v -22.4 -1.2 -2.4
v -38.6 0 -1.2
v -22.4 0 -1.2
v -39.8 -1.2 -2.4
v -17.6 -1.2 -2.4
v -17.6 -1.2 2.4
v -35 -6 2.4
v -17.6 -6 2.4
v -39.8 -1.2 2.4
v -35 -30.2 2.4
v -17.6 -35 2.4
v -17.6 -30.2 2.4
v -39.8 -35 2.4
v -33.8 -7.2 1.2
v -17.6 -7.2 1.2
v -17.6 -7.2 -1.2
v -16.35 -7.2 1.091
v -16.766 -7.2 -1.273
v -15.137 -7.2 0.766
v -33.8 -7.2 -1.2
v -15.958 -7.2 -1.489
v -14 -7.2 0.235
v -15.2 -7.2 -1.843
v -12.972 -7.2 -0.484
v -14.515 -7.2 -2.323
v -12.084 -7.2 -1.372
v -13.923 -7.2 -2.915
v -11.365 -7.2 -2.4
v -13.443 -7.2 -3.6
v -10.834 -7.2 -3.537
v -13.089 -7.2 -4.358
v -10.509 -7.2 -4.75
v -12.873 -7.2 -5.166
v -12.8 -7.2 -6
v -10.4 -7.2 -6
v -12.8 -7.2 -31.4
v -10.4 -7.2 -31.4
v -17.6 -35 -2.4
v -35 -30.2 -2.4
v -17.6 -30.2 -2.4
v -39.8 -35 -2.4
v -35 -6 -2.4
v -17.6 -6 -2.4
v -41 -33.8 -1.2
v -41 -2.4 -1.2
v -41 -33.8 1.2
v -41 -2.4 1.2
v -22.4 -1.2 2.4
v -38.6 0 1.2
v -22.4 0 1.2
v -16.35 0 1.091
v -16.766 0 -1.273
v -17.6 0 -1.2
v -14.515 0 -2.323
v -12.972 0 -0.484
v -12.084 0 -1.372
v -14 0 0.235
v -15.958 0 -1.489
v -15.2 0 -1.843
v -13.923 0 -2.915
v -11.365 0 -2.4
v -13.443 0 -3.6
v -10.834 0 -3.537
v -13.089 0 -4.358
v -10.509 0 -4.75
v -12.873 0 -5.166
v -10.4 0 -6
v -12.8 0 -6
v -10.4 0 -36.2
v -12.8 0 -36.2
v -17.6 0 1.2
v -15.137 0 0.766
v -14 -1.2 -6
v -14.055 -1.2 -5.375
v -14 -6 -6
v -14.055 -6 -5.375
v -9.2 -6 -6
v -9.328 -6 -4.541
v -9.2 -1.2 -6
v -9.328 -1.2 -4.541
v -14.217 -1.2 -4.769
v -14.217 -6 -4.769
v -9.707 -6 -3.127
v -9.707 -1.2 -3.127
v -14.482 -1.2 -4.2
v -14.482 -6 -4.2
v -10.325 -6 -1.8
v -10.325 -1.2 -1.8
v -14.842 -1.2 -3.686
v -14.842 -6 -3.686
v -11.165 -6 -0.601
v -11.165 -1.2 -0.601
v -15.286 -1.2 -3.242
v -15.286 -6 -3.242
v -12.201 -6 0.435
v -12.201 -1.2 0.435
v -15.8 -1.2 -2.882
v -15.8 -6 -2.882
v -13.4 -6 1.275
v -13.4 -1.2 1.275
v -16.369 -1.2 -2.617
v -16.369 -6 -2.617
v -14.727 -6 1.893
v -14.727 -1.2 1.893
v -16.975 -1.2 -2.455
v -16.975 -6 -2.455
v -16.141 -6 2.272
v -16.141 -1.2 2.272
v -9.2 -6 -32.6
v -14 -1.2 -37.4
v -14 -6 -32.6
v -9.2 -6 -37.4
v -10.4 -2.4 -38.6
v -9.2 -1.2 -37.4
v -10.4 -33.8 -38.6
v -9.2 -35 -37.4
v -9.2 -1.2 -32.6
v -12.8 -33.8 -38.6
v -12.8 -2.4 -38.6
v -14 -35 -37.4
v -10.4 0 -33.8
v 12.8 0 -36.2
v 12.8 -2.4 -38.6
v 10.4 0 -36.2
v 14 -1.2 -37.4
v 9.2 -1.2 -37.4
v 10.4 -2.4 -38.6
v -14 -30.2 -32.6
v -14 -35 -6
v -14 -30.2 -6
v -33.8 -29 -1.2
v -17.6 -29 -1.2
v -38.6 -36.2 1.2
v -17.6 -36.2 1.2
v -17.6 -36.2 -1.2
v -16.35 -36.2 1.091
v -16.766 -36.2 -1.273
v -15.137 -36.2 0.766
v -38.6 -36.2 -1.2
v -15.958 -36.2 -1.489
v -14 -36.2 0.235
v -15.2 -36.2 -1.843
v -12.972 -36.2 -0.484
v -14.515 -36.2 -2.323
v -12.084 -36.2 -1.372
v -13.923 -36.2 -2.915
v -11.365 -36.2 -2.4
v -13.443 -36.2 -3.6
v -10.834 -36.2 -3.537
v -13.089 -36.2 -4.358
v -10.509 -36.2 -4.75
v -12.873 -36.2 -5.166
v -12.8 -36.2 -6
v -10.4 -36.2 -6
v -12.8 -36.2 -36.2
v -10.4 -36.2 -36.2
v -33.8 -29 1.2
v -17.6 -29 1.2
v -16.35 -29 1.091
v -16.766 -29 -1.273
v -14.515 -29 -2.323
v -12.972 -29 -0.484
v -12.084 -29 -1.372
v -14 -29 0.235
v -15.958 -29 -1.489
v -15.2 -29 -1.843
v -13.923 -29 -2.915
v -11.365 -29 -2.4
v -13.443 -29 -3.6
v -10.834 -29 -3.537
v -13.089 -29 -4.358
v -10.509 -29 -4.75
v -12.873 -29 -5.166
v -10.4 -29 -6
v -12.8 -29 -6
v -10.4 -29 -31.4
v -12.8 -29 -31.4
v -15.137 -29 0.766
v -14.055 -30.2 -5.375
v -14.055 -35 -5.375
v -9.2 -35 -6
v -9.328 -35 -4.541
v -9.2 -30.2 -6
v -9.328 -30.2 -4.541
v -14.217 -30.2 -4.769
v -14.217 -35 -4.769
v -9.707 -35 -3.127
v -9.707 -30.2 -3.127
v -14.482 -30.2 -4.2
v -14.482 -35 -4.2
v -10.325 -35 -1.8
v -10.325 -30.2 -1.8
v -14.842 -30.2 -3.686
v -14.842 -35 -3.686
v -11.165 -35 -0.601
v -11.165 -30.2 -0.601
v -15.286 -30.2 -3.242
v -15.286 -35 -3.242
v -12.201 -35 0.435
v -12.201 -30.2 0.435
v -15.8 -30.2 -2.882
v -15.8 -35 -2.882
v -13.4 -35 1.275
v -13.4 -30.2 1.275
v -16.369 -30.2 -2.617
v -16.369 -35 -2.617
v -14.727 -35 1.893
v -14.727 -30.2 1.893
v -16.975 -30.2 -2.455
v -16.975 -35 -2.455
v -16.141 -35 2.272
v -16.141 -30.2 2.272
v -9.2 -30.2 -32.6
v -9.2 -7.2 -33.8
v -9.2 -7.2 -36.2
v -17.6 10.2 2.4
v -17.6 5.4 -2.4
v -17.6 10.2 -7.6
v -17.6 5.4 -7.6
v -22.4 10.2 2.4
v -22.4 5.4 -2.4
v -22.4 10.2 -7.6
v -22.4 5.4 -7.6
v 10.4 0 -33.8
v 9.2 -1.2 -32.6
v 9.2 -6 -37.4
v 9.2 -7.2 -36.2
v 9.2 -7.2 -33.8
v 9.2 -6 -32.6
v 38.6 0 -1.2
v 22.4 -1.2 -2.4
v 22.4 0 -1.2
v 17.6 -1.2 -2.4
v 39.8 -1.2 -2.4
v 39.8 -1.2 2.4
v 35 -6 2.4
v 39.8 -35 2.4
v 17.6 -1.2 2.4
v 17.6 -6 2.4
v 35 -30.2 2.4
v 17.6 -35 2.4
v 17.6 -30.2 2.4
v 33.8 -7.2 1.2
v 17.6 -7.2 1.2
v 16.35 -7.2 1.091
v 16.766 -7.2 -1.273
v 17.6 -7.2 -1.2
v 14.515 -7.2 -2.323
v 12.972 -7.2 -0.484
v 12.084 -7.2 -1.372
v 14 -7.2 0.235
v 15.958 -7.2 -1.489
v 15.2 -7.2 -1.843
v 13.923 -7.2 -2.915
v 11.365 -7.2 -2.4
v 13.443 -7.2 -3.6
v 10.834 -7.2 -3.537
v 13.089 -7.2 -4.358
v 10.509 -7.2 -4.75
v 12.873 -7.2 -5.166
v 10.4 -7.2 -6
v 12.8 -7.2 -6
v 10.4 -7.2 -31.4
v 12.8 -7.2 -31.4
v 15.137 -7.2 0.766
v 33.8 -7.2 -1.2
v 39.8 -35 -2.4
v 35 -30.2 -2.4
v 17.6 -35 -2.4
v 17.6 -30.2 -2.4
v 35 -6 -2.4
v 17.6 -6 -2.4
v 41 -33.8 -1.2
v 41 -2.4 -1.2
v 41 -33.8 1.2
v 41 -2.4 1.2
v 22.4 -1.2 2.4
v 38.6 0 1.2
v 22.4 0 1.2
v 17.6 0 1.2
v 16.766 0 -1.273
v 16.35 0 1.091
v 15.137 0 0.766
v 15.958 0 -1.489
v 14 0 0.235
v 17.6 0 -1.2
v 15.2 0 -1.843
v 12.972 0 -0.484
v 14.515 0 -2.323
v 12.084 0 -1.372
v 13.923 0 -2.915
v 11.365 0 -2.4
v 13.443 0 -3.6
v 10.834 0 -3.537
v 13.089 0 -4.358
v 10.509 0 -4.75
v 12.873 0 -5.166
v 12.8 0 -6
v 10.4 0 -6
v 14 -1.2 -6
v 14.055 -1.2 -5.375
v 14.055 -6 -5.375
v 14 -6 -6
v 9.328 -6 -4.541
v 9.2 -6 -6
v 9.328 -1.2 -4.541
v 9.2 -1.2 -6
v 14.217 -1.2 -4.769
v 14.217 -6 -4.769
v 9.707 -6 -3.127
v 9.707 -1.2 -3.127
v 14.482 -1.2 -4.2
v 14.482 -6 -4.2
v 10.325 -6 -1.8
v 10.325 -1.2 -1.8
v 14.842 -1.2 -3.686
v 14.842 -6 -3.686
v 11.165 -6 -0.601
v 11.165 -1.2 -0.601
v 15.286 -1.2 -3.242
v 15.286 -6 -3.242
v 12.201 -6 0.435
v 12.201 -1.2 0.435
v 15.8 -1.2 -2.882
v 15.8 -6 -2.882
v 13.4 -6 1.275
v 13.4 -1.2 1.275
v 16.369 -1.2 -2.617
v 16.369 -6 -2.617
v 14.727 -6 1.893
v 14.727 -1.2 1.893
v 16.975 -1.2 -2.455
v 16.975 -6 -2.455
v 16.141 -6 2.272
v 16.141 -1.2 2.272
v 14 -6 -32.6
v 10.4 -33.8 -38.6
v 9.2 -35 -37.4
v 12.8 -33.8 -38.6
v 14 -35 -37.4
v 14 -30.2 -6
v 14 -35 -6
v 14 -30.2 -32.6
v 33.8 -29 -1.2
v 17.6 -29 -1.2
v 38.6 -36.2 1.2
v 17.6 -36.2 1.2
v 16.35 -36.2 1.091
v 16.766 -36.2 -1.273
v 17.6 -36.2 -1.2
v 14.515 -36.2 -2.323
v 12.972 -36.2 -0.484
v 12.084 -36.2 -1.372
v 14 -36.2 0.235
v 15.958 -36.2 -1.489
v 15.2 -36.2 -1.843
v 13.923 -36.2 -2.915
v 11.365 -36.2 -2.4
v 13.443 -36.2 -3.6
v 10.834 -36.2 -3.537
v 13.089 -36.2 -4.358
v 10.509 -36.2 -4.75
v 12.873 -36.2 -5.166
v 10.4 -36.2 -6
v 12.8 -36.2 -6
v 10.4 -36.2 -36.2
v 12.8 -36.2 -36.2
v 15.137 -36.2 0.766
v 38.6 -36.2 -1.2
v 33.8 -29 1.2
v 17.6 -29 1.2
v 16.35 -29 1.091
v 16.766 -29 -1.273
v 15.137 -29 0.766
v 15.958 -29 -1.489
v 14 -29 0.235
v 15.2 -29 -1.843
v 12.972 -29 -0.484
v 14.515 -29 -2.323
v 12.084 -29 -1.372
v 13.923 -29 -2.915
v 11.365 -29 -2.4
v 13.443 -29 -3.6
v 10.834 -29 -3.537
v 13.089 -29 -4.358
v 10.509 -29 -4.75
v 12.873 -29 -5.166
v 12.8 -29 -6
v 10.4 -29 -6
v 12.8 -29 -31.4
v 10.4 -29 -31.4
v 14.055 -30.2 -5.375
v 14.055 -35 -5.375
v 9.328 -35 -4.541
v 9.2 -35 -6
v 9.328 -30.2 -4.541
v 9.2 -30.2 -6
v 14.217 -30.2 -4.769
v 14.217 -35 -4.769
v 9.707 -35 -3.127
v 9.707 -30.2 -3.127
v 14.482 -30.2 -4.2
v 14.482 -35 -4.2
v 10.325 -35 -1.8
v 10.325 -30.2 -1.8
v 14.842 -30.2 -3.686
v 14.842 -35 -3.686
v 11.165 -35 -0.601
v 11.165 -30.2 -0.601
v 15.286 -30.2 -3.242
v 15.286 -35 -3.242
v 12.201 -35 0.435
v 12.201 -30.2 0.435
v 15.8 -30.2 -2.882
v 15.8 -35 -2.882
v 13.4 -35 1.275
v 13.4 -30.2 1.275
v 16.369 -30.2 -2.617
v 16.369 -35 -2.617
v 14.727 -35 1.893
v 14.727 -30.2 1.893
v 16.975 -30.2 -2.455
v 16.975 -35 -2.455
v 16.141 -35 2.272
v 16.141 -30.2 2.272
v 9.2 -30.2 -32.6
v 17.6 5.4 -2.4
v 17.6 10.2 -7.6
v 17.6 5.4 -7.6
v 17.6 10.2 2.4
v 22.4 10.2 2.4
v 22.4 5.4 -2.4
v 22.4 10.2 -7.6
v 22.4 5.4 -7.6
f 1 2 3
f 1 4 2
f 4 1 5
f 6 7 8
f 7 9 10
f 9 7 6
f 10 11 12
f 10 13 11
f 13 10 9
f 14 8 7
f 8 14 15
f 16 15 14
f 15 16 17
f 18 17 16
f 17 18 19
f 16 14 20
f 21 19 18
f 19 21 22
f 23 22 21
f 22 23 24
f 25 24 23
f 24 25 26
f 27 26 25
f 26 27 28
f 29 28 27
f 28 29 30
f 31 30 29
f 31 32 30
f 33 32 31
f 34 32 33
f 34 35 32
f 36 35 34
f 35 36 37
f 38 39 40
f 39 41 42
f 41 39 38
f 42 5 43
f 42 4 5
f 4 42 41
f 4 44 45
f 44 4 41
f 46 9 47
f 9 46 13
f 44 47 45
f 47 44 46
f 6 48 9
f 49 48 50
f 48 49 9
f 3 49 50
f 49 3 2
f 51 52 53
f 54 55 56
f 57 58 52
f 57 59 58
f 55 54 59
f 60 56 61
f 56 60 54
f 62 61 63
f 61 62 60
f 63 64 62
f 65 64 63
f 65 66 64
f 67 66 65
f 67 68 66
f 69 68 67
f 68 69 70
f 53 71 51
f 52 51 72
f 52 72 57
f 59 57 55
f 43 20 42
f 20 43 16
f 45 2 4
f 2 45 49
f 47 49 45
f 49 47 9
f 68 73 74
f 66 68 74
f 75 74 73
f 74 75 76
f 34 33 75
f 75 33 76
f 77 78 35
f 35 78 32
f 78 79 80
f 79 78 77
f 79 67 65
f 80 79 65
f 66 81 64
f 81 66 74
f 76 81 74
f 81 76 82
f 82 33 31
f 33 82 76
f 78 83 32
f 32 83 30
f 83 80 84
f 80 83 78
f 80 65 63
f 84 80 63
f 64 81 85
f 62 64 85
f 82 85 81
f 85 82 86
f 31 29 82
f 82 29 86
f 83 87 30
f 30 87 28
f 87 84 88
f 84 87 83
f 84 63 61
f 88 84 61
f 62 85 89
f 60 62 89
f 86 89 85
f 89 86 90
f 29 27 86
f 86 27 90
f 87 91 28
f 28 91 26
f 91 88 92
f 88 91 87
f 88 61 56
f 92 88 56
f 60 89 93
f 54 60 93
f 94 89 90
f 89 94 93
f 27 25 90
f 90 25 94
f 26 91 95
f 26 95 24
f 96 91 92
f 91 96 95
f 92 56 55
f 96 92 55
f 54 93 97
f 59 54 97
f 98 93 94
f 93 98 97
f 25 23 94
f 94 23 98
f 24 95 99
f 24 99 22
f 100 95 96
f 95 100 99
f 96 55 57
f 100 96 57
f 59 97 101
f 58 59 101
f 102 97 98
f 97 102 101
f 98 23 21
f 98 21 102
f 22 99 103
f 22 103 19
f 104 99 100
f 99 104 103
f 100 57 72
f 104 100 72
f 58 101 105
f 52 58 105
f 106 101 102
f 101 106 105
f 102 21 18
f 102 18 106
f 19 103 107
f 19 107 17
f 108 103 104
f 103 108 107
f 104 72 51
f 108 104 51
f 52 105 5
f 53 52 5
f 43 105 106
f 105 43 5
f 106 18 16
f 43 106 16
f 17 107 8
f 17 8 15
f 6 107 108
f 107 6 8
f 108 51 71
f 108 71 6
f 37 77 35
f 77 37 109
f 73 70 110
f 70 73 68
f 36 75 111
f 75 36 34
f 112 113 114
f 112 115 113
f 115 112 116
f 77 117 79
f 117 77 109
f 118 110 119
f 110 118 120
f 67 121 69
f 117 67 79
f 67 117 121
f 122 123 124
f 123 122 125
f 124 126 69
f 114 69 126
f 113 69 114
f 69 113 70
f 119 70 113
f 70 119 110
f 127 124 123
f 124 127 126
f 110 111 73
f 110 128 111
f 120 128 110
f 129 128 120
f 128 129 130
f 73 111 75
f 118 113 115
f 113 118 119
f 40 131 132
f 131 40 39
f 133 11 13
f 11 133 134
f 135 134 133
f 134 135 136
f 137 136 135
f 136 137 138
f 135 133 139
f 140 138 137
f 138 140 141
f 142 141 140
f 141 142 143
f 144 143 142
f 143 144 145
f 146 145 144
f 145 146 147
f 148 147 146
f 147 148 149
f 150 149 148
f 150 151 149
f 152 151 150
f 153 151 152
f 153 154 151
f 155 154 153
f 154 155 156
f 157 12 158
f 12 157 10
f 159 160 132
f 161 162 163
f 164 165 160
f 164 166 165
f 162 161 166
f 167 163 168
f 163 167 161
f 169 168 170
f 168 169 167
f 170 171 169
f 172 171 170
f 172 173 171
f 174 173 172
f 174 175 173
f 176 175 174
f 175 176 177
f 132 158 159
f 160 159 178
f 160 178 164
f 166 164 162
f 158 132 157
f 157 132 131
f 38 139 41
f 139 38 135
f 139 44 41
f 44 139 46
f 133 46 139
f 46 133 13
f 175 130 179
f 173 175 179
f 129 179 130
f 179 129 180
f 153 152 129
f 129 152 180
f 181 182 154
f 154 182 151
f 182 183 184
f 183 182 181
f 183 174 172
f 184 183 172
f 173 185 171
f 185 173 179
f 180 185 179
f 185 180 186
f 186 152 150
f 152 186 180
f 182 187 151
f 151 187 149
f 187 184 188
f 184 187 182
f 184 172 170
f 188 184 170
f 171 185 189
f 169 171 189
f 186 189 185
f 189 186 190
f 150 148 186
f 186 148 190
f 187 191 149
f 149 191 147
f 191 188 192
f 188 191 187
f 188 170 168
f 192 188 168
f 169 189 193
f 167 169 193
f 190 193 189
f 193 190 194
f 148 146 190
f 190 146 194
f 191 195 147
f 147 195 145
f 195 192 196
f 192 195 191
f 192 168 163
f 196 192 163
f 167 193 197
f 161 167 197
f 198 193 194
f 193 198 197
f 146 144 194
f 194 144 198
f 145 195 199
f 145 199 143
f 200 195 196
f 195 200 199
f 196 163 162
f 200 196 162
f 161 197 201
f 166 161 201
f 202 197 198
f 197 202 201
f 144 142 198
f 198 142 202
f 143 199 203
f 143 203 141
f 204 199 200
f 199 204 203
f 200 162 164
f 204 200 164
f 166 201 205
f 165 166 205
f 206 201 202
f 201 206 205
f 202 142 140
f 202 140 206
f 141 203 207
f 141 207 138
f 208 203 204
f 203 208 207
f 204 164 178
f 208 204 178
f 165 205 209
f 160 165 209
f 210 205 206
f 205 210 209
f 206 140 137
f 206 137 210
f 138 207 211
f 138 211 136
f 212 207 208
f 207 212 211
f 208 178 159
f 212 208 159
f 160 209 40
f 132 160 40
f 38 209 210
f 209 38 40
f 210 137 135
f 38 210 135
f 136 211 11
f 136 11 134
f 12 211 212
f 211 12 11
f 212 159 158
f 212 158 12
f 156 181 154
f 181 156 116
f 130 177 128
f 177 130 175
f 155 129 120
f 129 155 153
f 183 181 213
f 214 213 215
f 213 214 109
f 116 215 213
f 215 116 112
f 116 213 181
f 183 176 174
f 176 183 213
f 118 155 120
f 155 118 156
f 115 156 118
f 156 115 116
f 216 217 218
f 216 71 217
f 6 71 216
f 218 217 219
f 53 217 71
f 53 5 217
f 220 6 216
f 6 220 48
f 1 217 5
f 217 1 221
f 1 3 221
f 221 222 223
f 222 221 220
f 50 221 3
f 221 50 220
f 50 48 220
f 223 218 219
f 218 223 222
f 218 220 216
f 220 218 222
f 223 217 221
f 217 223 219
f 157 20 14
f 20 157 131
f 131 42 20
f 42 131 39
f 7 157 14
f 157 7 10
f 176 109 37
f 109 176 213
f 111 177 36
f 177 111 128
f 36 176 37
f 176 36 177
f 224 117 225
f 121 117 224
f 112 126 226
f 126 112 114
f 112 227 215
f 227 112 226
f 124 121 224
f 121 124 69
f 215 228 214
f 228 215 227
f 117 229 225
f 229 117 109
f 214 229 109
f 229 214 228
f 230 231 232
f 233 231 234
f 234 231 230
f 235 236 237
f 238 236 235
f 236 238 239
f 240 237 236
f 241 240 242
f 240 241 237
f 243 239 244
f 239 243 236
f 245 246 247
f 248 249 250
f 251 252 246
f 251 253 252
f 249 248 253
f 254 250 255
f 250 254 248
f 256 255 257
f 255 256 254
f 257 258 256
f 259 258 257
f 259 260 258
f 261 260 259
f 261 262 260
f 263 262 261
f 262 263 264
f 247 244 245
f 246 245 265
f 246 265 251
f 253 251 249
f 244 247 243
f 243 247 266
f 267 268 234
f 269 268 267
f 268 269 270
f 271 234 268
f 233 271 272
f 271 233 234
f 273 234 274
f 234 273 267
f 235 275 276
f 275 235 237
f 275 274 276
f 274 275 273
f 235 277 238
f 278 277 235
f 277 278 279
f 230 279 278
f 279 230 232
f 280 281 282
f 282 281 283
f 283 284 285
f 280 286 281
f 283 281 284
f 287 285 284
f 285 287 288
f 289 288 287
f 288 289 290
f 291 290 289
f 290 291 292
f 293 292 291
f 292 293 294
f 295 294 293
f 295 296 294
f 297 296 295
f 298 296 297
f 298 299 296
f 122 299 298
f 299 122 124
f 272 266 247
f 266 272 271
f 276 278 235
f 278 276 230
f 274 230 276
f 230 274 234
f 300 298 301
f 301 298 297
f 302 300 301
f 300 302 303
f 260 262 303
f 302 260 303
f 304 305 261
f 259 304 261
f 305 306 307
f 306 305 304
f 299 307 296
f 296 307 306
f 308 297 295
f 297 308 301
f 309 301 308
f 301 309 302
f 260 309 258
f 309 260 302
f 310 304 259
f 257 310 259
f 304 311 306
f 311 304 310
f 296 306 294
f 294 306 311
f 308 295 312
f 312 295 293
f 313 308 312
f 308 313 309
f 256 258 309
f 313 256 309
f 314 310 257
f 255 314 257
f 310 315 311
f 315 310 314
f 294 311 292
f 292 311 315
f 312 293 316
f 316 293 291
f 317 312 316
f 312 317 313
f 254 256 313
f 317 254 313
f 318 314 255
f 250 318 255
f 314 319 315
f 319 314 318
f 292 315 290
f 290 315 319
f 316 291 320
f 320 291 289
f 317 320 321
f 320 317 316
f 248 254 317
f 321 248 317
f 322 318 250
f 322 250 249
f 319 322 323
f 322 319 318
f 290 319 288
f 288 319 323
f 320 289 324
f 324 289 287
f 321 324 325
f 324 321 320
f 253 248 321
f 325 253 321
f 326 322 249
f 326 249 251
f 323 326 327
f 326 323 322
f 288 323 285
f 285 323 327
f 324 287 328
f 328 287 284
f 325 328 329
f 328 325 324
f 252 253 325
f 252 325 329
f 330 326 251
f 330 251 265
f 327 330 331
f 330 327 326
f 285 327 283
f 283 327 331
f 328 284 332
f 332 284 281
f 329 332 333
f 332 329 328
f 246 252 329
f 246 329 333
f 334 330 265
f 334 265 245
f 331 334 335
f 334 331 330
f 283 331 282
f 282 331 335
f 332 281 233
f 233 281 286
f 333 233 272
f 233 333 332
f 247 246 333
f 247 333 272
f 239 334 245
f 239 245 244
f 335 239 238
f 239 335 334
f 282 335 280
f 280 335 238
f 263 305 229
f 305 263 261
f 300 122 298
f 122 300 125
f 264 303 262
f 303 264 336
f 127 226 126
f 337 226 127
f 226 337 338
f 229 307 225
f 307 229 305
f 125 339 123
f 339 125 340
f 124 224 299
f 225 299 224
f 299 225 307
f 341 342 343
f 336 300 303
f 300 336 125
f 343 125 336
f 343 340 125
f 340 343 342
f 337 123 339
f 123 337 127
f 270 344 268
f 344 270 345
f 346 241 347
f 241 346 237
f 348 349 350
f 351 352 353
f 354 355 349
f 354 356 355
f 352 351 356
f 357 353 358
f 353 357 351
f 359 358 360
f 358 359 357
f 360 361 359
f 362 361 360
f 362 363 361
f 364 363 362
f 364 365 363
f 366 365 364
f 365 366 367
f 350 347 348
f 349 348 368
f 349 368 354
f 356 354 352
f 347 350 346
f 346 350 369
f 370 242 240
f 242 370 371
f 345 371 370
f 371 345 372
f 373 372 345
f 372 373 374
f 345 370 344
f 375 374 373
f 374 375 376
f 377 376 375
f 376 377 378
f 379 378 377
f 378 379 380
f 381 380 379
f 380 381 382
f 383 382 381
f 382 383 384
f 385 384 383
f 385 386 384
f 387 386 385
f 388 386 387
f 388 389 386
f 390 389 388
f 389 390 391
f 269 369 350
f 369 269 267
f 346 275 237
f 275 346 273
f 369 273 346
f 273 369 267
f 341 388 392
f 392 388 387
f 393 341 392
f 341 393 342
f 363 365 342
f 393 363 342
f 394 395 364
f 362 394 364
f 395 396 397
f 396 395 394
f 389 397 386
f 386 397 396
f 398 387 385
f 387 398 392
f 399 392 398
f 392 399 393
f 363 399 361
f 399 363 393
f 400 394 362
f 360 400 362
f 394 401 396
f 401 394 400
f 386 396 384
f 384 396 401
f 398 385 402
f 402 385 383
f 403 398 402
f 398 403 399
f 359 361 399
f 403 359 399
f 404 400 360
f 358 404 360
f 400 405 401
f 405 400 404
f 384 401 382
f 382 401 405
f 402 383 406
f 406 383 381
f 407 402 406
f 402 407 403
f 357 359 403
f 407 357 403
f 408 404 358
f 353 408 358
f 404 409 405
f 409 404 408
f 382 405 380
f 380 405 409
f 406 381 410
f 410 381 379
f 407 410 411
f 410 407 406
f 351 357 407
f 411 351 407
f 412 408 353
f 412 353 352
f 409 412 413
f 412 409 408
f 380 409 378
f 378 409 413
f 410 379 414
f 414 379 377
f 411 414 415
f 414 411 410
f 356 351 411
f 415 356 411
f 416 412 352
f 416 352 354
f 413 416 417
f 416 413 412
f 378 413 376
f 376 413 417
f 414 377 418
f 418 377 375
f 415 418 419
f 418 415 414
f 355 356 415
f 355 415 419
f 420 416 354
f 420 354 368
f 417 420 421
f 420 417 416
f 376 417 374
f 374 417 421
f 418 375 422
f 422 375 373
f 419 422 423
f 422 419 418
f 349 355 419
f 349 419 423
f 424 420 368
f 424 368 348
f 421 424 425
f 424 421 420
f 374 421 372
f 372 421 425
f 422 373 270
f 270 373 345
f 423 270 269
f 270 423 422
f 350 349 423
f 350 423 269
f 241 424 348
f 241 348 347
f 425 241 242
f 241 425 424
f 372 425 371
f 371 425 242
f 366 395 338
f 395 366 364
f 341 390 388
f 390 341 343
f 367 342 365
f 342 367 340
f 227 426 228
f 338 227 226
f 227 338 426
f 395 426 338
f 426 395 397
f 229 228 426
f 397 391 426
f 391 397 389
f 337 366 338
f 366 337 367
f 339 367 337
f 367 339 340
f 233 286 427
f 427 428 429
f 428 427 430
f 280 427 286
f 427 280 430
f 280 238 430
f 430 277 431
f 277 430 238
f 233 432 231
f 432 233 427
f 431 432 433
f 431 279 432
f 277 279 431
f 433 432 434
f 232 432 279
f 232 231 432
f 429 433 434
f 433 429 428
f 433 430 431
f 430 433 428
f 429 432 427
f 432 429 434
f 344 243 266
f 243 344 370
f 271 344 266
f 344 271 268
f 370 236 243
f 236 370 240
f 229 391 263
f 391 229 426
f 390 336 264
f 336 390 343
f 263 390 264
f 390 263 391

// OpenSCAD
// 穴: 5mm x 15mm
// 厚さ: 5.3mm
// 縦の距離: 40mm

fragments = 36;
isJbl = false;
isHasami = false;
isPot = false;
isPillCase = false;
isQcyEarCuff = false;
isVernierCaliper = false;
is100KinEarphoneCase = false;

x = 2.4;
y = 4.8;
module p() {
    polygon([
            [x + 2.4, y],
            [x, -y],
            [-x, -y],
            [-x + 2.4, y],
            [-x + 2.4 + 1, y + 1],
            [x + 2.4 - 1, y + 1],
        ]);
}

module p2() {
    polygon([
            [2.4, 2.4],
            [2.4, -2.4],
            [-2.4, -2.4],
            [-2.4, 2.4],
            [-2.4 + 1, 2.4 + 1],
            [2.4 - 1, 2.4 + 1],
        ]);
}

module tip() {
    rotate_extrude(angle = 360, convexity = 10, $fn=128) {
        translate([0, 0, 0])
        polygon([
            [2.4, 2.4],
            [2.4, -2.4],
            [0, -2.4],
            [0, 2.4],
            [0, 2.4 + 1],
            [2.4 - 1, 2.4 + 1],
        ]);
    }
}

// size = [37.4, 12.4, 20.2]; // JBL イヤホン
// size = [12, 4, 7.2]; // ハサミ
// size = [18, 4, 37.2]; // ノギス
// size = [50, 6.6, 0]; // IKEA Pot
// size = [22, 29, 8]; // 鼻炎薬
// size = [58, 18, 8]; // QCY イヤーカフ
size = [29, 17.4, 26.6]; // 百均イヤホンケース

d = size[0];
w = size[1];
h = size[2];


if (isJbl) {
    translate([0, -22, 0])
    #cube([56, 29, 50], center = true);
}

if (isHasami) {
    translate([0, -9, 0])
    #cube([40, 3, 24], center = true);
}

if (isPot) {
    translate([0, -40, 22])
    #cylinder(h = 53, r1 = 43 / 2, r2 = 55 / 2, center = true, $fn = fragments);
}

if (isPillCase) {
    translate([0, -14, 0])
    #cube([88, 13.2, 30.2], center = true);
}

if (isQcyEarCuff) {
    translate([0, -32, 0])
    #cube([66, 49, 25.6], center = true);
}

if (isVernierCaliper) {
    translate([0, -12, 0])
    #cube([40, 9, 84], center = true);
}

if (is100KinEarphoneCase) {
    translate([0, -18, 0])
    // #cube([66, 21, 66], center = true);
    rotate([90, 0, 0])
    #cylinder(h = 21, r = 33, center = true);
}


/////////////////////////////////////////////////

module poly() {
    polygon([
        [1.2, 2.4 + 1.2],
        [2.4, 1.2 + 1.2],
        [2.4, -1.2 - 1.2],
        [1.2, -2.4 - 1.2],
        [-1.2, -2.4 - 1.2],
        [-2.4, -1.2 - 1.2],
        [-2.4, 1.2 + 1.2],
        [-1.2, 2.4 + 1.2],
    ]);
}

module xyz() {
    linear_extrude(height = 4.8, center = true, convexity = 10, $fn = fragments) {
        poly();
    }
}
module abc() {
    
    intersection() {
        xyz();
        rotate([0, 90, 0])
        xyz();

    }

}
module node() {
    union() {
        abc();
        rotate([0, 0, 90])
        abc();
    }
}




module curve() {
    rotate([90, 0, 0])
    rotate_extrude(angle = 90, convexity = 10, $fn = fragments) {
        translate([6, 0, 0])
        poly();
    }
}

module half() {
    hull() {
        translate([-20 - w, -3.6, 0])
        node();
        translate([-20 - w, -3.6 - d, 0])
        node();
    }
    hull() {
        translate([-11.6, -3.6, -8.4 - h])
        rotate([0, 90, 0])
        node();
        translate([-11.6, -3.6 - d, -8.4 - h])
        rotate([0, 90, 0])
        node();
    }

    hull() {
        translate([-9.2, -3.6, -8.4 - h])
        node();
        translate([0, -3.6, -8.4 - h])
        scale([0.5, 1, 1])
        rotate([0, 90, 0])
        xyz();
    }

    module fence() {
        hull() {
            translate([-20 - w, -3.6, 0])
            node();
            translate([-18.8, -3.6, 0])
            scale([0.5, 1, 1])
            rotate([0, 90, 0])
            xyz();
        }

        

        translate([-17.6, -3.6, -6])
        curve();

        hull() {
            translate([-11.6, -3.6, -8.4 - h])
            rotate([0, 90, 0])
            node();
            translate([-11.6, -3.6, -7.2])
            scale([1, 1, 0.5])
            xyz();
        }

    }
    fence();
    translate([0, -d, 0])
    fence();


    module hook() {
        translate([0, 4.8 - 1, 0])
        cube([4.8, 10, 4.8], center = true);
        translate([0, 5.4 + 2.4, -2.6])
        cube([4.8, 4.8, 10], center = true);
    }
    translate([-20, 0, 0])
    hook();
}

half();
mirror([1, 0, 0])
half();
